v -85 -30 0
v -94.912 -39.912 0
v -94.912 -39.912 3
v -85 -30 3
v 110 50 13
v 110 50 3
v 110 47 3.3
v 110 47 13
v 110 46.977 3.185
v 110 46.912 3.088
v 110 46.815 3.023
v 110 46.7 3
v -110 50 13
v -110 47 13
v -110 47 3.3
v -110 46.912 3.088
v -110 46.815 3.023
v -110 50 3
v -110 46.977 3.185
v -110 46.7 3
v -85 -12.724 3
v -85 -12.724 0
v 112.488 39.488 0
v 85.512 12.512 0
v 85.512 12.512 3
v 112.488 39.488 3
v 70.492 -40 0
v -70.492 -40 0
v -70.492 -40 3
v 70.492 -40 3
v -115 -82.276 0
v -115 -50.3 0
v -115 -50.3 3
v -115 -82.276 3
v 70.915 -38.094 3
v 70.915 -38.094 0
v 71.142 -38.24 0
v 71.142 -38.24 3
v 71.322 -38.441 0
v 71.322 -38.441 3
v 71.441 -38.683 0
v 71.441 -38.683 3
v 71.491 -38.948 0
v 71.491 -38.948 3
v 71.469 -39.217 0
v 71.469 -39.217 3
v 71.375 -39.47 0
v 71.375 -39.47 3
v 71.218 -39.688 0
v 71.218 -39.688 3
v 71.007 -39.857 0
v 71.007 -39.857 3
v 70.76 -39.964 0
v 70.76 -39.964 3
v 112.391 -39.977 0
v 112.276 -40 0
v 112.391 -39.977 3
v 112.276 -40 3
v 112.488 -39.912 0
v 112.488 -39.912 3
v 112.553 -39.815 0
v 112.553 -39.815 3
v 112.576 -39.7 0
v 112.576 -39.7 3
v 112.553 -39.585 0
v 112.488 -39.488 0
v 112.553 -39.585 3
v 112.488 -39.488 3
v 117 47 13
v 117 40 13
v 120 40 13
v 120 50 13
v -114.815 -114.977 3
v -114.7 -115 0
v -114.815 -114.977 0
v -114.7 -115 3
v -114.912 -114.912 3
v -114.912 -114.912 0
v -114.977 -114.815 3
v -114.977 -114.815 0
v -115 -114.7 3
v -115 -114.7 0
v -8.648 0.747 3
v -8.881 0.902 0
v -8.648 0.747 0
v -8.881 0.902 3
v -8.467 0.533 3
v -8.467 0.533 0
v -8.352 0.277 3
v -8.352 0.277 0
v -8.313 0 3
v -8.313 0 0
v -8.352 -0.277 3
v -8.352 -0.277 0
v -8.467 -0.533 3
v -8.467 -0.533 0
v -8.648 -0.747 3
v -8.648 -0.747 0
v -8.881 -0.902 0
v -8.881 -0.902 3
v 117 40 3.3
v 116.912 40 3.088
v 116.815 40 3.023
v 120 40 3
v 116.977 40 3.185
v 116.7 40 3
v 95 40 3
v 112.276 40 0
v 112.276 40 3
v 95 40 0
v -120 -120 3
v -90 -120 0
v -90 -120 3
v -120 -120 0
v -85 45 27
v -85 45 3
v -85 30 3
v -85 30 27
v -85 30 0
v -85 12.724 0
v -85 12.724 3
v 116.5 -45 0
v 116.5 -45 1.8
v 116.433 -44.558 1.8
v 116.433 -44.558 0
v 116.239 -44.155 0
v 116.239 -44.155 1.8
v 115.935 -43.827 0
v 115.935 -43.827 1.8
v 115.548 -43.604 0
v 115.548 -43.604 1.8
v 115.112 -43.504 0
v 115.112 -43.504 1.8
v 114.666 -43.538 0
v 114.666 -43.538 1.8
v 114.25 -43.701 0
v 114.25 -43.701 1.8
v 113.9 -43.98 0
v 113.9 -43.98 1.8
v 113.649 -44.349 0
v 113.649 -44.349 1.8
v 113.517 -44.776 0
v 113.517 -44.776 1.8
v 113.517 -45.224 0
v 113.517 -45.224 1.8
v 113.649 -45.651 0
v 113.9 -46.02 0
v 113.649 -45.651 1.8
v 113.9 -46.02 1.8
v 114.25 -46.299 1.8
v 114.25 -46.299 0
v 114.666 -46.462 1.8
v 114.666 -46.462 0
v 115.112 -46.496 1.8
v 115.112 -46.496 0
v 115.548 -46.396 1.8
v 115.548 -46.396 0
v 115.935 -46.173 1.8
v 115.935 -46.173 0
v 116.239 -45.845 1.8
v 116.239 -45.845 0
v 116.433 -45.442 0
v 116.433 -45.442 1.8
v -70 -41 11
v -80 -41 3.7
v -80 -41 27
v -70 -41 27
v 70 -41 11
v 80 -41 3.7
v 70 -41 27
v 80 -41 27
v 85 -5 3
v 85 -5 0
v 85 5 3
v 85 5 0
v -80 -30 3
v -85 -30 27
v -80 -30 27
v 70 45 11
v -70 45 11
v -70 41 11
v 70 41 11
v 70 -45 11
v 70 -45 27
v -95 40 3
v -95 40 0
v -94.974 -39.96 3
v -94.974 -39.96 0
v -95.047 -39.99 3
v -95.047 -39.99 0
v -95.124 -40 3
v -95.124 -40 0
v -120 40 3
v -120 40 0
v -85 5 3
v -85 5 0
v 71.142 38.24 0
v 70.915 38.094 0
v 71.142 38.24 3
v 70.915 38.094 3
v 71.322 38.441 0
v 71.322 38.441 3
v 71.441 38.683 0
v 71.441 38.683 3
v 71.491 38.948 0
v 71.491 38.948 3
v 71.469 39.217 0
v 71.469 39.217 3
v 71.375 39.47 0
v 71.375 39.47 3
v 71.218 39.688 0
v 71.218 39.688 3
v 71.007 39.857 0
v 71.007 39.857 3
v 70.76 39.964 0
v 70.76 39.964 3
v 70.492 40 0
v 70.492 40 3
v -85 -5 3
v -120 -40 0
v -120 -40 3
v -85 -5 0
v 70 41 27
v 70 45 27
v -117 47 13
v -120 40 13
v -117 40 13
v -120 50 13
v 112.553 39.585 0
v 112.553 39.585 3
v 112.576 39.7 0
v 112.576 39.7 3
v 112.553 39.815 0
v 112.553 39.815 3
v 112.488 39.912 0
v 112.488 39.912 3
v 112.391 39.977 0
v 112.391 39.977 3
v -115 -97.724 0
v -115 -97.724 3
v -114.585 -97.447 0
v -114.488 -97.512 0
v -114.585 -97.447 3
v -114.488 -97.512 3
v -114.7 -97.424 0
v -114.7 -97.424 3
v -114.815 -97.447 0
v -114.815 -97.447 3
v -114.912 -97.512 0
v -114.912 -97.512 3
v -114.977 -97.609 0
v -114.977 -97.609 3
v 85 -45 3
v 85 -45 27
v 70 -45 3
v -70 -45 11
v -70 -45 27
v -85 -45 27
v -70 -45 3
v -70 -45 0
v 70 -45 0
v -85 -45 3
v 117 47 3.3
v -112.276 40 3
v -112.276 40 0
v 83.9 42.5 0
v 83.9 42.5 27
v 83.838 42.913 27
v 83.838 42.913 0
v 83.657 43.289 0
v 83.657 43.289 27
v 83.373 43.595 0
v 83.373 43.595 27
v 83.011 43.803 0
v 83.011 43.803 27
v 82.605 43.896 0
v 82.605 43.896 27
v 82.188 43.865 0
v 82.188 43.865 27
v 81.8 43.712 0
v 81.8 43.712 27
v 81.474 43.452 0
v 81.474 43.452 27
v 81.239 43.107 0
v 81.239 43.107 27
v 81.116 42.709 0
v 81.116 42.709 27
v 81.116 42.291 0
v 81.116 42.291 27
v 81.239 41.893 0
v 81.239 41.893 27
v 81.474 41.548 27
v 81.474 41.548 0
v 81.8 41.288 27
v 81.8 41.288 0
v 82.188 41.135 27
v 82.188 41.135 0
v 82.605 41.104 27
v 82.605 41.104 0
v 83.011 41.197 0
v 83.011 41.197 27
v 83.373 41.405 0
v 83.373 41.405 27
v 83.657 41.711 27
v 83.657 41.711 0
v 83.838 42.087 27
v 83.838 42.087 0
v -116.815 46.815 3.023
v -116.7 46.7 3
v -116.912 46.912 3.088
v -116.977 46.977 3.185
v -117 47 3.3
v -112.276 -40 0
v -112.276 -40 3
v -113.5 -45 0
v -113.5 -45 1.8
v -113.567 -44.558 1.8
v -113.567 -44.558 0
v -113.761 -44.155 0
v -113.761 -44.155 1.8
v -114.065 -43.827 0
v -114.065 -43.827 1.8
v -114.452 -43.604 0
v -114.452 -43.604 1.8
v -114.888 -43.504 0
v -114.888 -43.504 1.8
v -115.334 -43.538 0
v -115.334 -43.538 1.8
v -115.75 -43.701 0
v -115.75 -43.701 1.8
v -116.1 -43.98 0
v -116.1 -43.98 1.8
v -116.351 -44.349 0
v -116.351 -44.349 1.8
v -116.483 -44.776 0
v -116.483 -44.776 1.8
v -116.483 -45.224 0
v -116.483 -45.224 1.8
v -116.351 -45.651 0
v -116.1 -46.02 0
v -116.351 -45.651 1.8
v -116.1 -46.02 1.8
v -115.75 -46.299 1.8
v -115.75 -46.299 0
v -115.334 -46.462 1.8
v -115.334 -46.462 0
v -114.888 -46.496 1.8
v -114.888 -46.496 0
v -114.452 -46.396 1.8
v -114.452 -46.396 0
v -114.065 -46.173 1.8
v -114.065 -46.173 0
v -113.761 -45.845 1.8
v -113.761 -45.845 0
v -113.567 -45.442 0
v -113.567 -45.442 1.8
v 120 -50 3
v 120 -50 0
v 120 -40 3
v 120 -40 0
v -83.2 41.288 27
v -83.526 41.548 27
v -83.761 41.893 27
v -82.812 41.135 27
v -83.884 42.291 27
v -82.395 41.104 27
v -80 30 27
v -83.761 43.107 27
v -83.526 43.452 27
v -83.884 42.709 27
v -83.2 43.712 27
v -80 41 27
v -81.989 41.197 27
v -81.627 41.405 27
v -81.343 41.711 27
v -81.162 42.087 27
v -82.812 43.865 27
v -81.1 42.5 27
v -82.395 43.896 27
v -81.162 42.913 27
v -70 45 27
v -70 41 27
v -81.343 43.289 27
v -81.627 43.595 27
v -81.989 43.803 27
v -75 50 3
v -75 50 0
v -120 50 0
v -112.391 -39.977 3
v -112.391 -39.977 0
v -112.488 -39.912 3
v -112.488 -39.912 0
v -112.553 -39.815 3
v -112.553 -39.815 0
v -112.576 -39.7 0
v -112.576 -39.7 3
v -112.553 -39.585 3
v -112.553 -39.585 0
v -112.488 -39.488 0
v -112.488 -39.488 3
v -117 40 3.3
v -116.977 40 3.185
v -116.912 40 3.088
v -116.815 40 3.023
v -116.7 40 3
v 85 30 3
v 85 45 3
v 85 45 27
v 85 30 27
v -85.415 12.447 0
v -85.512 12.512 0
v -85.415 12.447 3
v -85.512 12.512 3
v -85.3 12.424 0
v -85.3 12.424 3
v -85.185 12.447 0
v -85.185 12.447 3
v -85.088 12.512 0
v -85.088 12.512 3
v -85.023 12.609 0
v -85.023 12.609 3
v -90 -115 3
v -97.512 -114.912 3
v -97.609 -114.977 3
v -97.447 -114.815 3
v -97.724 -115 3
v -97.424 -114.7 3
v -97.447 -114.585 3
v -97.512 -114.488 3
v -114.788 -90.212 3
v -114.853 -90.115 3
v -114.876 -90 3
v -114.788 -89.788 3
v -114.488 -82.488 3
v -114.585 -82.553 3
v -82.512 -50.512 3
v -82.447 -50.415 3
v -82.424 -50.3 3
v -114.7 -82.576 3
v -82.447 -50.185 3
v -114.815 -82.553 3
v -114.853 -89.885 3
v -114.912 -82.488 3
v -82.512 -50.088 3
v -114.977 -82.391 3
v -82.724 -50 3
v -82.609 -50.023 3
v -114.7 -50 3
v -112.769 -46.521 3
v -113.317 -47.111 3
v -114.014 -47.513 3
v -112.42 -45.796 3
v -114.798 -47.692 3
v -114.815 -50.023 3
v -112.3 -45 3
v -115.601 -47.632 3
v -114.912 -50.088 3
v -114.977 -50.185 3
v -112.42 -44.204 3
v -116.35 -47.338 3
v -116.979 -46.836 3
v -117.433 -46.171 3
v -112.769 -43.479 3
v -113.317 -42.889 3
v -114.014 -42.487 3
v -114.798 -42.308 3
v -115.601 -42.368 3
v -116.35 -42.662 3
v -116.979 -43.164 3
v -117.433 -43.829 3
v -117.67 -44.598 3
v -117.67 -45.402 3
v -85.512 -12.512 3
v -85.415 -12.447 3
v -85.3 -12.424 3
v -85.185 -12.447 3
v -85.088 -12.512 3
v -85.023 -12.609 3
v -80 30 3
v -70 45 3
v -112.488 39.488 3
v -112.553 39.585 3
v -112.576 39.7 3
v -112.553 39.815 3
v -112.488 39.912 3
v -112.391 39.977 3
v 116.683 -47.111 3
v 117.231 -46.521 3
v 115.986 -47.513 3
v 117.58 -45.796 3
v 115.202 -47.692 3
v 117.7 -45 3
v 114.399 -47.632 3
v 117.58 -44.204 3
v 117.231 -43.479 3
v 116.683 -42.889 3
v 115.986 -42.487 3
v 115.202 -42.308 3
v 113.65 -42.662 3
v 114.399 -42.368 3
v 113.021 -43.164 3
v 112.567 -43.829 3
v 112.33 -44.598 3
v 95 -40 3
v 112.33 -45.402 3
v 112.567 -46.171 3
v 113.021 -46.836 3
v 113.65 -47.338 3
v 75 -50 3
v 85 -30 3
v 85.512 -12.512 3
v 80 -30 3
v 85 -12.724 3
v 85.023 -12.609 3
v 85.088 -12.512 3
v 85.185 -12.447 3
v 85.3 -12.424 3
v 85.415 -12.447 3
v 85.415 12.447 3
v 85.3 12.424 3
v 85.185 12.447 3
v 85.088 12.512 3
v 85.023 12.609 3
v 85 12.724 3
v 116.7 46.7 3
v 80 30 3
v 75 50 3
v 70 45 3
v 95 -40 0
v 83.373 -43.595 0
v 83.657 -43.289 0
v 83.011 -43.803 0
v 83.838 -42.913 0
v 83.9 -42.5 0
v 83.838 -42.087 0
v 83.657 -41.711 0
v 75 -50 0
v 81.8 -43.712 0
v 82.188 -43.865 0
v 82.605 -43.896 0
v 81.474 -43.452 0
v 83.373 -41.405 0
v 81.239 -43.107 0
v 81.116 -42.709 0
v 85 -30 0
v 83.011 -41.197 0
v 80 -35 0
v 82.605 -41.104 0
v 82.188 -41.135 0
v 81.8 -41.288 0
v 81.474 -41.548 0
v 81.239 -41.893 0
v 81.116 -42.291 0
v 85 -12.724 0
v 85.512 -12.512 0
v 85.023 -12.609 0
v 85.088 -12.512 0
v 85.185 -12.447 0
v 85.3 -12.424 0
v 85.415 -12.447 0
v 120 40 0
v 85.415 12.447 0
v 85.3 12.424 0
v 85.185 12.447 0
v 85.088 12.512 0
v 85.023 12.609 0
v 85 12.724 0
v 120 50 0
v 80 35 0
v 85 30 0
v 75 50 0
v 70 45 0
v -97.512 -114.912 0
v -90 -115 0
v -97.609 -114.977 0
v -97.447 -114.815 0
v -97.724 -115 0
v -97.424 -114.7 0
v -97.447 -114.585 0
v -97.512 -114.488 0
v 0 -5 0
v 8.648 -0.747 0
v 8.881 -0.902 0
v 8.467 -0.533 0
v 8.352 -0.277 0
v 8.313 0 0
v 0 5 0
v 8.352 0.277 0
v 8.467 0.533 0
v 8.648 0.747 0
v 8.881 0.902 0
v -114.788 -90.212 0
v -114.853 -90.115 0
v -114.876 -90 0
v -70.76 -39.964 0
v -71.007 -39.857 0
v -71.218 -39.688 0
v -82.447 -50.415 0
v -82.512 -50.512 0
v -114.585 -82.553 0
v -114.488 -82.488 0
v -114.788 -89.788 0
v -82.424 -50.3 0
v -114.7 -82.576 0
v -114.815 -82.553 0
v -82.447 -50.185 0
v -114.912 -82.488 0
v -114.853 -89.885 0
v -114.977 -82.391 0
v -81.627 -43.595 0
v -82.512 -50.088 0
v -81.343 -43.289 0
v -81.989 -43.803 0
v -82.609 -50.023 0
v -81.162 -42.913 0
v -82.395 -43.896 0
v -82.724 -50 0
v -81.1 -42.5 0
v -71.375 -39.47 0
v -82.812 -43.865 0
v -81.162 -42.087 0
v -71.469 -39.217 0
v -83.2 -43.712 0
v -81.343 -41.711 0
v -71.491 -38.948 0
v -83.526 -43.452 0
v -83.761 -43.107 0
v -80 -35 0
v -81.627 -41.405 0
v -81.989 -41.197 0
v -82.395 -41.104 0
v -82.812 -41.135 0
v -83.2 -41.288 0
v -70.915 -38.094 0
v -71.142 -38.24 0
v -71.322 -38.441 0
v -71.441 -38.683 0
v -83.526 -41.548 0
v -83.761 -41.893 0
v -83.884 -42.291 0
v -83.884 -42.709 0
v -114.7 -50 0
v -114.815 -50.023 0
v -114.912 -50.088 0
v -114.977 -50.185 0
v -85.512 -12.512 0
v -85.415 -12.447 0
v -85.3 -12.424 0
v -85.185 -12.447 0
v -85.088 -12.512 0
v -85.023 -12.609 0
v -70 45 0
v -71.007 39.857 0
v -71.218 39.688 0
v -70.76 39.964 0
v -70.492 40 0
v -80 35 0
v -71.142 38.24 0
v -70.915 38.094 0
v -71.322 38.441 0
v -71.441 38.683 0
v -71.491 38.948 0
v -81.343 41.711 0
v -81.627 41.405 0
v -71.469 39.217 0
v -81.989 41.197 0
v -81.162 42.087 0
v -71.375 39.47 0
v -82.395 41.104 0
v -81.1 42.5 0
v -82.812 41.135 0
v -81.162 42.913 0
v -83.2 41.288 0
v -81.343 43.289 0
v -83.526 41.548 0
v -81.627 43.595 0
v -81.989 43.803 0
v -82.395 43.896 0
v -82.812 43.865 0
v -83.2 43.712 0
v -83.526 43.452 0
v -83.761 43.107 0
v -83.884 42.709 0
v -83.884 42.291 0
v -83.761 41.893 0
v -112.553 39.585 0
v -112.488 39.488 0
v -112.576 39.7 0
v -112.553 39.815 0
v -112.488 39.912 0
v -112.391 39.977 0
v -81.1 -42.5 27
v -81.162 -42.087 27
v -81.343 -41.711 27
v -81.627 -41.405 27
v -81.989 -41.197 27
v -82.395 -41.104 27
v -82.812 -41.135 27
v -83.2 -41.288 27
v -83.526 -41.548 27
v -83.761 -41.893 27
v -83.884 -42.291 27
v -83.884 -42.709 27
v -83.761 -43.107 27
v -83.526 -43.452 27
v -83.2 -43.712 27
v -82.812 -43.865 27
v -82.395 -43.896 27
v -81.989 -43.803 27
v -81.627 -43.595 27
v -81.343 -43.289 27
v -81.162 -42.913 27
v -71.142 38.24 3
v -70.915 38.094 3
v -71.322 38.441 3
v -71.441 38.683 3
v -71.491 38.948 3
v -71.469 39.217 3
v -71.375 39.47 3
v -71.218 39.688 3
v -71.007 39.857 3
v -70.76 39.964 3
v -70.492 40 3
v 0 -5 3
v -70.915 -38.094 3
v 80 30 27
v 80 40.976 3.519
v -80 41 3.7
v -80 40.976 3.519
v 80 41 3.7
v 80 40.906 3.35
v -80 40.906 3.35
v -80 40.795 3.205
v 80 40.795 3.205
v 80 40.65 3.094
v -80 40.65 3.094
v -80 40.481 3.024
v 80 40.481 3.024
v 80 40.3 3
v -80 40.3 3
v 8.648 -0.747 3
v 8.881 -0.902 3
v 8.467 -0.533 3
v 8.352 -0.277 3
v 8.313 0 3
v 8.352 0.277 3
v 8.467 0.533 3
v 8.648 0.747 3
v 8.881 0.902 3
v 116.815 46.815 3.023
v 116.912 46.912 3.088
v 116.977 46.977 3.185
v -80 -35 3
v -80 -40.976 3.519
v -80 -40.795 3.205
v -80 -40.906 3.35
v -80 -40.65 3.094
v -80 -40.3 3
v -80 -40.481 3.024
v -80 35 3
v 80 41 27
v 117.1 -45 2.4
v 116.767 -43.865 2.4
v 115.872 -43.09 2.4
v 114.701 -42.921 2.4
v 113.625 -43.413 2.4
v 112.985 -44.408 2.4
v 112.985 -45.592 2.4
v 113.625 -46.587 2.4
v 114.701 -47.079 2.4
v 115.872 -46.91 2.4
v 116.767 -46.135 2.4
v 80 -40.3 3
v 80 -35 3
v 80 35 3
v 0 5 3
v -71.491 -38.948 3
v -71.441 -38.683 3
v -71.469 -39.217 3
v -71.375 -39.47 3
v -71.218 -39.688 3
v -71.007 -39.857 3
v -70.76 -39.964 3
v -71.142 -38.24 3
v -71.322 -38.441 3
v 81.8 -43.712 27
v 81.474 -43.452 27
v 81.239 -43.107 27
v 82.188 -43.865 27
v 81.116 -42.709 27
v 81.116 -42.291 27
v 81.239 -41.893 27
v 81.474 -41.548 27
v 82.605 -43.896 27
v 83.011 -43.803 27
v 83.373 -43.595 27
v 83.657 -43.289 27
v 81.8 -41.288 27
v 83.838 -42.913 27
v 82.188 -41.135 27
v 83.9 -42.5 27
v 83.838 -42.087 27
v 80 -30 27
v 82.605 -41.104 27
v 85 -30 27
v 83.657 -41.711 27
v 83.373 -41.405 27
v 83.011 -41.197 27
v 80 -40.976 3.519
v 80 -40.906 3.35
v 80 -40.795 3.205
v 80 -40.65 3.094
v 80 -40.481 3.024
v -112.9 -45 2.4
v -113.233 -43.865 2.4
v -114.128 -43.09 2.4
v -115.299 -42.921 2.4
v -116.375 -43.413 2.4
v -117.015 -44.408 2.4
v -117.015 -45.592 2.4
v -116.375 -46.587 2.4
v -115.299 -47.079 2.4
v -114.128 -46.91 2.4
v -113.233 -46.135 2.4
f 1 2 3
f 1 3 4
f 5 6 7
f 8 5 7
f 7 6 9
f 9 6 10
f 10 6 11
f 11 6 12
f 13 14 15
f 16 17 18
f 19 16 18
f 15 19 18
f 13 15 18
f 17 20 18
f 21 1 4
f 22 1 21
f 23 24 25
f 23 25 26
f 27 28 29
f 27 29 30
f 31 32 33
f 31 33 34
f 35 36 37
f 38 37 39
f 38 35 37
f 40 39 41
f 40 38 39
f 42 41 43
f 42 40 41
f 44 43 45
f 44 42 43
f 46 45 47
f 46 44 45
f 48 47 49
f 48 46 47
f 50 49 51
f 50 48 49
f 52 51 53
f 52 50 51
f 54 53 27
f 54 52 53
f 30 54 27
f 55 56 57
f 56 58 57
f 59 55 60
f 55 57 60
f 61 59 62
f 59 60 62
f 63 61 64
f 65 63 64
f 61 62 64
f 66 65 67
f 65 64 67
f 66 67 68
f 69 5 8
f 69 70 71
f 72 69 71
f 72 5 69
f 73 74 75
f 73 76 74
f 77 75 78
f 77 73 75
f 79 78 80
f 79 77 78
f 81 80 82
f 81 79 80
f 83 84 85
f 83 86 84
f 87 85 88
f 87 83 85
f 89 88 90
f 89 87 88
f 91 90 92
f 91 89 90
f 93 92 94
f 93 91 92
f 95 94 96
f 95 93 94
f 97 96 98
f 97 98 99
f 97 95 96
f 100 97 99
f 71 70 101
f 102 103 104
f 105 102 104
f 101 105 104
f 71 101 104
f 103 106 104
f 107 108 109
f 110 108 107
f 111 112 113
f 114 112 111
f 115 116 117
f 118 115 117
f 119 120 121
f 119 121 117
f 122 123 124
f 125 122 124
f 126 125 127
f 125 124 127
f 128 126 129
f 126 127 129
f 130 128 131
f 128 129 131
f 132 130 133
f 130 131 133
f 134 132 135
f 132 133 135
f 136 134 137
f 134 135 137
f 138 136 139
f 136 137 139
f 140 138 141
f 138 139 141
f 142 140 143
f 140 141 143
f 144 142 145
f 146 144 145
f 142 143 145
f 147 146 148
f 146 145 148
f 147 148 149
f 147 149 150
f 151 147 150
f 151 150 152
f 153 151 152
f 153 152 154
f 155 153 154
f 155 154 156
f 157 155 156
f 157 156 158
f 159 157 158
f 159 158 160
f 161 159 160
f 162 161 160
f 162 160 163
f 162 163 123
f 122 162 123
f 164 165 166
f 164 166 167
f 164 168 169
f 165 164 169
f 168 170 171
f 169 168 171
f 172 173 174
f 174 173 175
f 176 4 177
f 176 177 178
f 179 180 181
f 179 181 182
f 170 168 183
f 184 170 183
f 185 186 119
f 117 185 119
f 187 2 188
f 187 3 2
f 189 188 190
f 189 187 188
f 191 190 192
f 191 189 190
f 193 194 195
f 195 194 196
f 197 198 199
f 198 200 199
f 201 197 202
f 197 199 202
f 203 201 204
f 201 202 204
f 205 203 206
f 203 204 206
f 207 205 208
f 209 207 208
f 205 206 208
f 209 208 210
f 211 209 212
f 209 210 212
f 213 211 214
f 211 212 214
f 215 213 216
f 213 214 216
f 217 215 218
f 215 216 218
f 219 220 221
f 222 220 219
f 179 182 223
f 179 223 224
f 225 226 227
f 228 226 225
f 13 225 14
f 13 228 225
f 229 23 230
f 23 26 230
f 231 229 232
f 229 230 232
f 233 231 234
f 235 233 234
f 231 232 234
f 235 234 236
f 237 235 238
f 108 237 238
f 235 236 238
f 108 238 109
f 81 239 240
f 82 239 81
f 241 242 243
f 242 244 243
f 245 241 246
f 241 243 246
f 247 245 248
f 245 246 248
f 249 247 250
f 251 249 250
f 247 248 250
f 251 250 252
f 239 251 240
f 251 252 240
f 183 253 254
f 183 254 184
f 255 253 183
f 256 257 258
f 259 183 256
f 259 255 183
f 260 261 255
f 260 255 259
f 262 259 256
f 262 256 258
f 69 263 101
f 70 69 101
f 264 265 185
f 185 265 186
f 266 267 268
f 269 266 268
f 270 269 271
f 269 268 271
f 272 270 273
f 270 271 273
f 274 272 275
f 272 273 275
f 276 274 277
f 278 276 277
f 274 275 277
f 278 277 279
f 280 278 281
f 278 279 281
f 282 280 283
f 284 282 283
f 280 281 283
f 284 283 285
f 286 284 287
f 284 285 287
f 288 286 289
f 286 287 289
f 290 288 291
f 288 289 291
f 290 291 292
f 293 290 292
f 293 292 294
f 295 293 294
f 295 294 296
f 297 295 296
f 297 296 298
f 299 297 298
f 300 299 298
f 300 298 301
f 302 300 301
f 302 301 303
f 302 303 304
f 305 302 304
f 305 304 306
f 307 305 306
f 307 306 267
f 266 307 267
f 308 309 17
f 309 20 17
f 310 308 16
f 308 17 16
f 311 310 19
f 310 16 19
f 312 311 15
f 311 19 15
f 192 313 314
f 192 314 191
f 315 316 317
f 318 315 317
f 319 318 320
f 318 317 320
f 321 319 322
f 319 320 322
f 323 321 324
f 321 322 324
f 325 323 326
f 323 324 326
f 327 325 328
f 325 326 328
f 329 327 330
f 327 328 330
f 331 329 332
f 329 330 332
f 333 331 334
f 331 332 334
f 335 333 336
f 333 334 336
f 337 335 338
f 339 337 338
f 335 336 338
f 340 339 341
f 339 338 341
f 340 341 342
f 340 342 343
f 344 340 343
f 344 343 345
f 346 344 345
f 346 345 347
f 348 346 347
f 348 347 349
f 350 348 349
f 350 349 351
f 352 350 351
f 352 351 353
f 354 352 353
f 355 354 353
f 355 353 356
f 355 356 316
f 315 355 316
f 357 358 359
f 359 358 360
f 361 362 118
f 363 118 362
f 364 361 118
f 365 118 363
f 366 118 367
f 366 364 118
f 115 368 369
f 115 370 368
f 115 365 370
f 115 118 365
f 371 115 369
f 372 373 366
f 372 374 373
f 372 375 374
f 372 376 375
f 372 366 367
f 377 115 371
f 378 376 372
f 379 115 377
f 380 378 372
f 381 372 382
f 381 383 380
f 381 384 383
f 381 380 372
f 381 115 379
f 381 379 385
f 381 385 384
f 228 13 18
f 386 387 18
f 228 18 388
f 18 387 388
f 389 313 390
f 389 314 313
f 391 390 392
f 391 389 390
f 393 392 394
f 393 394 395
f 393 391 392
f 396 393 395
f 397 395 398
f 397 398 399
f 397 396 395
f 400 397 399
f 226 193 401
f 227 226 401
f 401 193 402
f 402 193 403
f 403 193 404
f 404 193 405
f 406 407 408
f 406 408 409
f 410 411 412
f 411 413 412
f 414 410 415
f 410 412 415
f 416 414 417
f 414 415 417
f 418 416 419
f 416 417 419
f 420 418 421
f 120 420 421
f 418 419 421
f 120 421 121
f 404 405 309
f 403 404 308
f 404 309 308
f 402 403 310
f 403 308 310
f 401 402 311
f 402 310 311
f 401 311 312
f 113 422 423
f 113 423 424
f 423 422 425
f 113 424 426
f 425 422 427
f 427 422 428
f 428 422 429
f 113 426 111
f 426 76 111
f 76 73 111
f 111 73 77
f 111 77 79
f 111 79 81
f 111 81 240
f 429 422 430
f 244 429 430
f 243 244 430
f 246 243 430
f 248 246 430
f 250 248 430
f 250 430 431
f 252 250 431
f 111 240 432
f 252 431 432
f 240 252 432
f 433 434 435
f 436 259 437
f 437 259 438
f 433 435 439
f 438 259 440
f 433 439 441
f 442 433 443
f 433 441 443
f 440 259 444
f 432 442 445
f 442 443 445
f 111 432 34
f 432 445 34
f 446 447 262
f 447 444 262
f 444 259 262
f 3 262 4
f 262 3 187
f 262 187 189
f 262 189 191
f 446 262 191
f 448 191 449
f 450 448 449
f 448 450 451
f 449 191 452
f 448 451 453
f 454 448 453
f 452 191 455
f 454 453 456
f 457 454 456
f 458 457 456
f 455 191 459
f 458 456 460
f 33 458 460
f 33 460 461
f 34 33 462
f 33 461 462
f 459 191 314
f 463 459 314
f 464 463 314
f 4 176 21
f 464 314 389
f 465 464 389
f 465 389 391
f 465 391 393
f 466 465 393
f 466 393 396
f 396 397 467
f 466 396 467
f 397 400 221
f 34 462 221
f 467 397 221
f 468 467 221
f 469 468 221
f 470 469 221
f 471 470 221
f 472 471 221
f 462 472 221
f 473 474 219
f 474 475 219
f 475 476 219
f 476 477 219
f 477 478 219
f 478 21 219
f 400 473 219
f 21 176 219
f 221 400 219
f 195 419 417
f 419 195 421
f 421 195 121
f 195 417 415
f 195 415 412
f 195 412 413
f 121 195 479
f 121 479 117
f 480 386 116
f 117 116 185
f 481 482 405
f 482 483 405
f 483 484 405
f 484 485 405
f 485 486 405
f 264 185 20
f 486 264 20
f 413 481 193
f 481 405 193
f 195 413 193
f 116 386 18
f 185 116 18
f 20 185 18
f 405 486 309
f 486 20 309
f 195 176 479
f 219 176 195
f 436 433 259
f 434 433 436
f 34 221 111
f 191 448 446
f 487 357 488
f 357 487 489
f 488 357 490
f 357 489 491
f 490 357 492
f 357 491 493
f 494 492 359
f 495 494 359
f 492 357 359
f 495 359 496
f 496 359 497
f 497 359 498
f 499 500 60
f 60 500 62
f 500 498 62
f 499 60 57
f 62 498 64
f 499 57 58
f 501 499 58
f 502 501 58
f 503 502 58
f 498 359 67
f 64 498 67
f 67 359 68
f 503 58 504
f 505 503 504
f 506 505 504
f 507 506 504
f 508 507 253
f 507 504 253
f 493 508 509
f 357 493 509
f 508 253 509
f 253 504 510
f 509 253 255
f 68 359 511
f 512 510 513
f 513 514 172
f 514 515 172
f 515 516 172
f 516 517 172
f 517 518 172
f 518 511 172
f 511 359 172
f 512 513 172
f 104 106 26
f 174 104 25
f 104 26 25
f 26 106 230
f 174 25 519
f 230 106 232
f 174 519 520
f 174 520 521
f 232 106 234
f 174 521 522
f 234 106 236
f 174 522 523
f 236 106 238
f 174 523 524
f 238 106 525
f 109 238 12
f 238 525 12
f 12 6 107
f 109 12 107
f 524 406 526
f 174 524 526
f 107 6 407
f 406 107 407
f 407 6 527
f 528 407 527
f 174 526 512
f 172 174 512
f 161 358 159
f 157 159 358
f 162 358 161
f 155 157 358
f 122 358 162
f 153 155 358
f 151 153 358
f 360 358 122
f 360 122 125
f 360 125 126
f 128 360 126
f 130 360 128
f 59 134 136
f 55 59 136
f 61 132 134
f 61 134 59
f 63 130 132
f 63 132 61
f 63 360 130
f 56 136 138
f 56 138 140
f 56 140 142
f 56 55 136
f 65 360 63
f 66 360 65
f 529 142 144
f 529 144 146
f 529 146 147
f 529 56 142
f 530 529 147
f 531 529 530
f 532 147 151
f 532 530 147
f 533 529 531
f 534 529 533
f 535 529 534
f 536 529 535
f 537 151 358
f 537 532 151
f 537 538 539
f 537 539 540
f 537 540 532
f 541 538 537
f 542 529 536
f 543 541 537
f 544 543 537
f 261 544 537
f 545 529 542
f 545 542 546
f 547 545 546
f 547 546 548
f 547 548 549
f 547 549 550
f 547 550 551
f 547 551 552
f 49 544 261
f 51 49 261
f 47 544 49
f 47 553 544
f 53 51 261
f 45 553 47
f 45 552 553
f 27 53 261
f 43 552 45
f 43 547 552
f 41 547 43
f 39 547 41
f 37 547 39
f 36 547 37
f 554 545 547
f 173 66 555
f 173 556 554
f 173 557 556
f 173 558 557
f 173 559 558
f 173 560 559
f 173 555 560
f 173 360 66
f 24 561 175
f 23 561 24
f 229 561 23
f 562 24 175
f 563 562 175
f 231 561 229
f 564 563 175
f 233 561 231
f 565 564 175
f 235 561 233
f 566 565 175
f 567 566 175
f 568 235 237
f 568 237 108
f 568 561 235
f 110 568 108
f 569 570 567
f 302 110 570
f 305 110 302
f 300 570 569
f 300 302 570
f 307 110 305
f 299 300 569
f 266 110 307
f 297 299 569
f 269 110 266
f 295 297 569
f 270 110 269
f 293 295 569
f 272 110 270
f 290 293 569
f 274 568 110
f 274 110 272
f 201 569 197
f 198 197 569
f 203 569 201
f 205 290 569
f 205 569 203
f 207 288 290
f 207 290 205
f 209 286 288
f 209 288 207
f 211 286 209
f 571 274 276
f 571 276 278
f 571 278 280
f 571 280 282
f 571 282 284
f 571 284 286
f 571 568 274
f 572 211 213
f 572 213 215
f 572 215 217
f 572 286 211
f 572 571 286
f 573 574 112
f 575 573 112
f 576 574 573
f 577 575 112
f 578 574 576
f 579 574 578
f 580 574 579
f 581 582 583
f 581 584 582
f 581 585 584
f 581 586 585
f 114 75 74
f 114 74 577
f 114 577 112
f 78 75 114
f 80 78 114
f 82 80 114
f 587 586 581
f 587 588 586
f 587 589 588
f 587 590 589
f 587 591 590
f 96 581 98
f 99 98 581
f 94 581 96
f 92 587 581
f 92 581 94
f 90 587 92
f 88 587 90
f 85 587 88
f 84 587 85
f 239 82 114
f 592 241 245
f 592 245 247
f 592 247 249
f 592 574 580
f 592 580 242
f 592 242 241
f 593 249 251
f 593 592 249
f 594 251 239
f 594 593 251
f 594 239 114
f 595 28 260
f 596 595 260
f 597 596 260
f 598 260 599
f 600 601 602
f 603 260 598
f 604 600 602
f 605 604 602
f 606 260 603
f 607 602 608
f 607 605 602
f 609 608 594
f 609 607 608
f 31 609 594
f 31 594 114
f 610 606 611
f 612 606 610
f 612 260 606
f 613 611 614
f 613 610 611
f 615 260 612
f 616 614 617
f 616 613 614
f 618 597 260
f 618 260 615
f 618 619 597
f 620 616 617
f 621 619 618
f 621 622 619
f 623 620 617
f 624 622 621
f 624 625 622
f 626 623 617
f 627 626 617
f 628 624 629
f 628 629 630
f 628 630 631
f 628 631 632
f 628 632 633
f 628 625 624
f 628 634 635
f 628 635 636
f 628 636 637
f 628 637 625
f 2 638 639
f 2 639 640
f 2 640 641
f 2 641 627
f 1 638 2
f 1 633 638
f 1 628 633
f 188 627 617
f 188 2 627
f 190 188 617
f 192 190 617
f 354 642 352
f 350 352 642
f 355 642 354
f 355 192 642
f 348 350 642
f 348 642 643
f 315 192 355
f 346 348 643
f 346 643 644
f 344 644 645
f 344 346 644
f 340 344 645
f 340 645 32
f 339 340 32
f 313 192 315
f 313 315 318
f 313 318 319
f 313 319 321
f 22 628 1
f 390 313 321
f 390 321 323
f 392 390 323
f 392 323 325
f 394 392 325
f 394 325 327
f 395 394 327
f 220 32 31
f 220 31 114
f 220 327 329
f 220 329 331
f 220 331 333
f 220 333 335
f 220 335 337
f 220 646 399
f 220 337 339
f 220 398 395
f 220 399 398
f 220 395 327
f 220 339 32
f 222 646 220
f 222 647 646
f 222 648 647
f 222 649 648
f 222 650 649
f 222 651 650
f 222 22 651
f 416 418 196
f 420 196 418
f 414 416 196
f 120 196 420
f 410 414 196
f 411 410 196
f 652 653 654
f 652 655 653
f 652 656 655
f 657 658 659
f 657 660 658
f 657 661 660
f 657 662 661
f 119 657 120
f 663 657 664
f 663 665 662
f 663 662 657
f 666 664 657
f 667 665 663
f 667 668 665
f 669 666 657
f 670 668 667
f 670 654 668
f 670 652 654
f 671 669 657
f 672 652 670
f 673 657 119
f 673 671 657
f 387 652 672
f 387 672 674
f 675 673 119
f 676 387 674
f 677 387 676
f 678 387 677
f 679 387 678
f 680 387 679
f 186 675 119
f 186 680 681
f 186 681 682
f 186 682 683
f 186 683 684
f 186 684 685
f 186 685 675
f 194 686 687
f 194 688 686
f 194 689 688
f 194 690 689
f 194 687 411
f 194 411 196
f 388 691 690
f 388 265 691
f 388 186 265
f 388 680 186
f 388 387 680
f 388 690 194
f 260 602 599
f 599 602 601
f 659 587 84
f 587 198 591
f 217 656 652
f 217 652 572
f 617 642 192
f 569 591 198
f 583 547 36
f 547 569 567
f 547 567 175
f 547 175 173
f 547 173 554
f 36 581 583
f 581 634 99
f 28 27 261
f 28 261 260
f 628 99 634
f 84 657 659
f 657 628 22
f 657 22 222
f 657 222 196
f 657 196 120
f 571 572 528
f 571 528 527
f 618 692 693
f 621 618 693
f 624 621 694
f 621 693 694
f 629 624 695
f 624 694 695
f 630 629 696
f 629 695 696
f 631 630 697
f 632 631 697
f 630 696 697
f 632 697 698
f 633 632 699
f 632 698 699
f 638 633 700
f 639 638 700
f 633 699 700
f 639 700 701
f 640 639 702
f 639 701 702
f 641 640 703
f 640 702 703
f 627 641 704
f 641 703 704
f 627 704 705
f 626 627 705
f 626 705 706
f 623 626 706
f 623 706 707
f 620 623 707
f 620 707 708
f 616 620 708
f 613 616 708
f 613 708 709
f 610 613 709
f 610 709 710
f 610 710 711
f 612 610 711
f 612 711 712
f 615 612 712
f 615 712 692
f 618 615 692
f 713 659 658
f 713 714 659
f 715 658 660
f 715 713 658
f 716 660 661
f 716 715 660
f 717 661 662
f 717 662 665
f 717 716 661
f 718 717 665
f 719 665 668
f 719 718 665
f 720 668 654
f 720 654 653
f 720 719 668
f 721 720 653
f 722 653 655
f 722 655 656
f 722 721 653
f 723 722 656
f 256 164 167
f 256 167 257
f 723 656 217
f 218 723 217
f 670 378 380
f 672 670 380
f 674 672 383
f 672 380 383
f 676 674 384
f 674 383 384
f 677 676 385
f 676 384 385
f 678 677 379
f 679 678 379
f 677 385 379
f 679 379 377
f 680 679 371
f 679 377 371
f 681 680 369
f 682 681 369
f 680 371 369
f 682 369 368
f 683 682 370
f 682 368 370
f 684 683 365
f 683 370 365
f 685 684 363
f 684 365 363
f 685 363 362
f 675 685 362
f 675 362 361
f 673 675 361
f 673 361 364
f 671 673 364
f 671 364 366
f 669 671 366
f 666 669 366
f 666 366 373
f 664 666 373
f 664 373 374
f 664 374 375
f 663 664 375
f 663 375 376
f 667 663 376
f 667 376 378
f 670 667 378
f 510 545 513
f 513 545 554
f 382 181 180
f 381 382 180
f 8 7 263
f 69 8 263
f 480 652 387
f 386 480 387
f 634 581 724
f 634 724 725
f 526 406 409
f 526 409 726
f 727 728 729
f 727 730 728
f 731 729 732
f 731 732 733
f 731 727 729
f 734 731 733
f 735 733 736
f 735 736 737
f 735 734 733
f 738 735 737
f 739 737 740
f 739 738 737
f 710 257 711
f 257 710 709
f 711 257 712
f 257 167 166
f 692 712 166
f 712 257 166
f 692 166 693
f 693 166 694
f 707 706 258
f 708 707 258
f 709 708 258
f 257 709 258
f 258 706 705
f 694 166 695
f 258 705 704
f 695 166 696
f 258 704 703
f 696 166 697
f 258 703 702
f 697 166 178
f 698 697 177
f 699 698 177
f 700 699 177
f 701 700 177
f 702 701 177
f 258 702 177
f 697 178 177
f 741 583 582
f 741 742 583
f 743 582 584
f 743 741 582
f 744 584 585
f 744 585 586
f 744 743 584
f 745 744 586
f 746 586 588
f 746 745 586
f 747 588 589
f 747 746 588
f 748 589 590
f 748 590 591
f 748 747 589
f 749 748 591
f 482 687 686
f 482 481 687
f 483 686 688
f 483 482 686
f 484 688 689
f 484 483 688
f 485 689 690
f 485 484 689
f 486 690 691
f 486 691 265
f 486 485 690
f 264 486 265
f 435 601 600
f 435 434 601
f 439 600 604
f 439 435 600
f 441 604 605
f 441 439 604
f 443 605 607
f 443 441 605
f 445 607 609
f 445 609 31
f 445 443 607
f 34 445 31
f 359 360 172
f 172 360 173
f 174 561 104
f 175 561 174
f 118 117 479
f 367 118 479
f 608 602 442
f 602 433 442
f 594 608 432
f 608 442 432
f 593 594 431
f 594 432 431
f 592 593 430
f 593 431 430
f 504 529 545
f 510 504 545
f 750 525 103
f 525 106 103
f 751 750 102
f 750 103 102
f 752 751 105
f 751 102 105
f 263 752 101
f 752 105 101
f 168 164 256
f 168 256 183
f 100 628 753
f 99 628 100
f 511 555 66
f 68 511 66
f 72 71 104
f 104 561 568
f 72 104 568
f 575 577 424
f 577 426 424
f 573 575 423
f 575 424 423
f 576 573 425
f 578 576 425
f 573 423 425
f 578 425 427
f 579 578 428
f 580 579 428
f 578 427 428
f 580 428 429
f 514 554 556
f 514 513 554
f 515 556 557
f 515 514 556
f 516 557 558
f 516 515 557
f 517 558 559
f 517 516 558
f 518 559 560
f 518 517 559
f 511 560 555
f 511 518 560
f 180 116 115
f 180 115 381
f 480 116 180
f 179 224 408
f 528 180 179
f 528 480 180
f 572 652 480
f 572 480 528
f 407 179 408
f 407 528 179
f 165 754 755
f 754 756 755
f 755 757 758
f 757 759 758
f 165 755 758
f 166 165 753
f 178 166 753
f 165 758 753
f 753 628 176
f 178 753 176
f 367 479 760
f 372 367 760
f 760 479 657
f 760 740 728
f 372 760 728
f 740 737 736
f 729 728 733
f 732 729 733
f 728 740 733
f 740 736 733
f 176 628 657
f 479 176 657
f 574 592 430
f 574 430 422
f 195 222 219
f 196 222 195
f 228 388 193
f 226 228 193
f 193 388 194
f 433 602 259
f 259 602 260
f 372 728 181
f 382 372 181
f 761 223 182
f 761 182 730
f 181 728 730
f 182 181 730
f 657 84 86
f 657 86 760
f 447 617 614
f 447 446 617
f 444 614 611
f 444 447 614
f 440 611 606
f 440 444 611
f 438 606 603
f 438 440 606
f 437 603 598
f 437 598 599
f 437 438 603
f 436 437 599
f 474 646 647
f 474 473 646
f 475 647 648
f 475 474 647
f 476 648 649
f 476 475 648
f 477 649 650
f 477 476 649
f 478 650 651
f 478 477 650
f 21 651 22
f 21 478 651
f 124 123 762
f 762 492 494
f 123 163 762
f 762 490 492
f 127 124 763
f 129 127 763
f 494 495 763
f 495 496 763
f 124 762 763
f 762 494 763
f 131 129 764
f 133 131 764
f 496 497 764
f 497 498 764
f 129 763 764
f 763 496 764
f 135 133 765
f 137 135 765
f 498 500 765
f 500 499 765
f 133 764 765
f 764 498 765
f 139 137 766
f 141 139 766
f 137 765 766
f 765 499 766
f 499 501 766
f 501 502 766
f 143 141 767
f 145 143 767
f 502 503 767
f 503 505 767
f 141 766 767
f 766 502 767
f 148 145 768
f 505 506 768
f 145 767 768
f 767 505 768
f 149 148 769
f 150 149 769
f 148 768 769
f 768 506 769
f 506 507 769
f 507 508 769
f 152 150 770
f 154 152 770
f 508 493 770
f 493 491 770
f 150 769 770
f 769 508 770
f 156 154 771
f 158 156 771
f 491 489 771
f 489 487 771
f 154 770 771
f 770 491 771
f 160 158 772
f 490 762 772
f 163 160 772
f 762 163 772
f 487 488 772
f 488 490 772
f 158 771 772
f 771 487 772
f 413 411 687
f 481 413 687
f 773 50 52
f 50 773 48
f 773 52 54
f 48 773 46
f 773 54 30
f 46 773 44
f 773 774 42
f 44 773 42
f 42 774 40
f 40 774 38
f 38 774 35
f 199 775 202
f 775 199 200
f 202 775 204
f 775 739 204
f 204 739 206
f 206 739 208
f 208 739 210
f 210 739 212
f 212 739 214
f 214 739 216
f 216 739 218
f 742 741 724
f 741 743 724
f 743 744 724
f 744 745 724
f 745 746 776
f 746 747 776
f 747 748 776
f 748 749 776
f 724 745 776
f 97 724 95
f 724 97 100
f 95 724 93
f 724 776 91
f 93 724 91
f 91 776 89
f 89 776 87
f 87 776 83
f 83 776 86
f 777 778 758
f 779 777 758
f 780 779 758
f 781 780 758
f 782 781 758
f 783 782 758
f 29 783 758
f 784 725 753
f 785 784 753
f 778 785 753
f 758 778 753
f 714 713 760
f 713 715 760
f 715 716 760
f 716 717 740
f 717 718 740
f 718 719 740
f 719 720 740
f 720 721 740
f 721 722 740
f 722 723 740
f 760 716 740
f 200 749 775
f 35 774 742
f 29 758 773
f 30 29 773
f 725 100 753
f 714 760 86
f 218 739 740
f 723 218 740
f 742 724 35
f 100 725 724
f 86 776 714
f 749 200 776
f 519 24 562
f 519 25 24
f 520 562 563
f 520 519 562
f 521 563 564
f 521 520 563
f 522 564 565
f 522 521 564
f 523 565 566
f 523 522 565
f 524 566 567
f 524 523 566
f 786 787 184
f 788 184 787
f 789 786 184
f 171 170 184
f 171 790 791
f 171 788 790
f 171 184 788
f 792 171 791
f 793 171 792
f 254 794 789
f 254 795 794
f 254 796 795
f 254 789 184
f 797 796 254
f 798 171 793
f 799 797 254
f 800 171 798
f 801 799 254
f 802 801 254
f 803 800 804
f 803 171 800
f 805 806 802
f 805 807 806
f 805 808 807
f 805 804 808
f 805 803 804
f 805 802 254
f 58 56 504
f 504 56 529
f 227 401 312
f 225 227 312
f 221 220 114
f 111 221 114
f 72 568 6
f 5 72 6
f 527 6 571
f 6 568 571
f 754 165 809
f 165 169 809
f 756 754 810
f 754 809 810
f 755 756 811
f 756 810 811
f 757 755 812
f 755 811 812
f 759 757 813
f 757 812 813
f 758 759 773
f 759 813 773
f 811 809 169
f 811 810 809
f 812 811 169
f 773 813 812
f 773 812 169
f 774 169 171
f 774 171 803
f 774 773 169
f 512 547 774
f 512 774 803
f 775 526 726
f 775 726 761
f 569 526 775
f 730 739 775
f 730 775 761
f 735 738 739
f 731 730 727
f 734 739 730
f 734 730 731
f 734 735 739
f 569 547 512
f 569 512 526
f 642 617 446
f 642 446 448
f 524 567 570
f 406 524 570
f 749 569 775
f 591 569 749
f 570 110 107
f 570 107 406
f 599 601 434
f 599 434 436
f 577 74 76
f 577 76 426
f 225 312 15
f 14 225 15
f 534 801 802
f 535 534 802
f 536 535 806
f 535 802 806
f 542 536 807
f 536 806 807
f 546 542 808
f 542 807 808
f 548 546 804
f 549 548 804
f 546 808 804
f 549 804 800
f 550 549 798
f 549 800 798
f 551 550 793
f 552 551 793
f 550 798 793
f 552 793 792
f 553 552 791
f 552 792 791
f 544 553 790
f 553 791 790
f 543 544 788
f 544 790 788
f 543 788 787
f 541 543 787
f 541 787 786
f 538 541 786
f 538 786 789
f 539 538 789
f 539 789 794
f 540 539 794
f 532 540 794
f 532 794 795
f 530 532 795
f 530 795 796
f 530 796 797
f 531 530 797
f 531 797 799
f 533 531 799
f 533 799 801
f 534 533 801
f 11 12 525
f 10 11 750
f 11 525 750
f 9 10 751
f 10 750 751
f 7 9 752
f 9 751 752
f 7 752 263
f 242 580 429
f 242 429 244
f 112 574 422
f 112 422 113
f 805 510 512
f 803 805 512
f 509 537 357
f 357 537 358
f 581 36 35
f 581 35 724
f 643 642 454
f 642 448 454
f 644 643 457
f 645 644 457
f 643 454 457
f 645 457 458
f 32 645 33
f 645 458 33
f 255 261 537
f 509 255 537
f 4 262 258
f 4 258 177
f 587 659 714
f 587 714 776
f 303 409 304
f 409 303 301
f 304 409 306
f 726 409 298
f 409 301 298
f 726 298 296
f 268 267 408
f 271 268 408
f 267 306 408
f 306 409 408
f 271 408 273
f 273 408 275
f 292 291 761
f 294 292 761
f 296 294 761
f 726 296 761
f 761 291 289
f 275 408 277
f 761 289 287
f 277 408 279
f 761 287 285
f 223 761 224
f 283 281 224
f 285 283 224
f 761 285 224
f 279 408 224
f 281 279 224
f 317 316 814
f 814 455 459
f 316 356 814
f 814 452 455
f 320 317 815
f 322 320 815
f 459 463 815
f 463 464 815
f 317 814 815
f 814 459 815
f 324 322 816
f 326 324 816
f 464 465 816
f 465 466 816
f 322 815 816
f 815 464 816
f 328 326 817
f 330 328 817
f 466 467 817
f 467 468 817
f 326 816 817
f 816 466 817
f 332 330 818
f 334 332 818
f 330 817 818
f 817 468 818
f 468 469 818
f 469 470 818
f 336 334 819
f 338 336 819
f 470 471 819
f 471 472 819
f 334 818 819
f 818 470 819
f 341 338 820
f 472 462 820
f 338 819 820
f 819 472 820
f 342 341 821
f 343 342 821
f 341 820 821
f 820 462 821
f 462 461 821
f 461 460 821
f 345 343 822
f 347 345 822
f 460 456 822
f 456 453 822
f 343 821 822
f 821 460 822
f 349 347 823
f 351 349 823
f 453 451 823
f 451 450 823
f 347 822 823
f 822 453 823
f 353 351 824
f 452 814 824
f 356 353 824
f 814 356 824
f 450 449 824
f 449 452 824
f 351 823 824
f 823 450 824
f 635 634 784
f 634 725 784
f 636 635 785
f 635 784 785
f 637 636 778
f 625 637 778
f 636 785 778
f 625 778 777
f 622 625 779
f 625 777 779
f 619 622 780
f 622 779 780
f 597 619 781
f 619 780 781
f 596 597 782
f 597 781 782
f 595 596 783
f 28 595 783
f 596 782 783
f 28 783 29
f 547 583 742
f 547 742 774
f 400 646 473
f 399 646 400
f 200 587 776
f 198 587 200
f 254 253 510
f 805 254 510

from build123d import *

# Parameters (mm, degrees)
SKETCH003_W     = 170
SKETCH003_H     = 90
SKETCH003_W_2   = 160
SKETCH003_H_2   = 80
PAD_DEPTH       = 3
PAD001_DEPTH    = 3
PAD002_DEPTH    = 3
PAD003_DEPTH    = 3
PAD004_DEPTH    = 3
PAD005_DEPTH    = 10
PAD006_DEPTH    = 10
PAD007_DEPTH    = 24
SKETCH014_R     = 1.65
HOLE_DEPTH      = 30
SKETCH015_R     = 1.325
HOLE001_DEPTH   = 30
SKETCH016_R     = 1.325
HOLE002_DEPTH   = 30
SKETCH017_R     = 1.325
HOLE003_DEPTH   = 30
FILLET_R        = 0.3
FILLET001_R     = 0.3
FILLET002_R     = 0.3
FILLET003_R     = 0.3
FILLET004_R     = 0.3
FILLET005_R     = 0.3
FILLET006_R     = 0.3
FILLET007_R     = 0.3
FILLET008_R     = 0.3
FILLET009_R     = 0.3
SKETCH018_W     = 3.707428
SKETCH018_H     = 3.707435
PAD008_DEPTH    = 27
SKETCH019_W     = 4.325348
SKETCH019_H     = 3.769226
PAD009_DEPTH    = 27
SKETCH020_W     = 4.473305
SKETCH020_H     = 4.349049
PAD010_DEPTH    = 27
SKETCH021_W     = 3.413819
SKETCH021_H     = 3.638272
PAD011_DEPTH    = 27
SKETCH023_R     = 1.4
POCKET_DEPTH    = 30
SKETCH024_R     = 1.4
POCKET001_DEPTH = 30
SKETCH025_R     = 1.4
POCKET002_DEPTH = 30
SKETCH026_R     = 1.4
POCKET003_DEPTH = 30
SKETCH027_R     = 1.5
POCKET004_DEPTH = 5
CHAMFER_SIZE    = 1.2
SKETCH028_W     = 10
SKETCH028_H     = 1
POCKET005_DEPTH = 24
SKETCH029_W     = 10
SKETCH029_H     = 1
POCKET006_DEPTH = 24
SKETCH030_W     = 10
SKETCH030_H     = 1
POCKET007_DEPTH = 24
PAD012_DEPTH    = 3
SKETCH032_W     = 140
SKETCH032_H     = 4
PAD013_DEPTH    = 8
FILLET010_R     = 0.7
FILLET011_R     = 1


with BuildPart() as part:
    # Sketch003 → Pad (new body)
    with BuildSketch(Plane.XY):
        Rectangle(SKETCH003_W, SKETCH003_H)
        Rectangle(SKETCH003_W_2, SKETCH003_H_2, mode=Mode.SUBTRACT)
    extrude(amount=PAD_DEPTH)

    # Sketch005 → Pad001 (join)
    with BuildSketch(Plane.XY):
        Polygon((-70, 45), (-75, 50), (-120, 50), (-120, 40), (-85, 5), (-85, 12), (-113, 40), (-95, 40), (-85, 30), (-85, 45), align=None)
    extrude(amount=PAD001_DEPTH)

    # Sketch007 → Pad002 (join)
    with BuildSketch(Plane.XY):
        Polygon((70, 45), (75, 50), (120, 50), (120, 40), (85, 5), (85, 12), (113, 40), (95, 40), (85, 30), (85, 45), align=None)
    extrude(amount=PAD002_DEPTH)

    # Sketch008 → Pad003 (join)
    with BuildSketch(Plane.XY):
        Polygon((70, -45), (75, -50), (120, -50), (120, -40), (85, -5), (85, -12), (113, -40), (95, -40), (85, -30), (85, -45), align=None)
    extrude(amount=PAD003_DEPTH)

    # Sketch009 → Pad004 (join)
    with BuildSketch(Plane.XY):
        Polygon((-70, -45), (-75, -50), (-115, -90), (-90, -115), (-90, -120), (-120, -120), (-120, -50), (-120, -40), (-85, -5), (-85, -12), (-113, -40), (-95, -40), (-85, -30), (-85, -45), align=None)
        Polygon((-115, -50), (-115, -83), (-82, -50), align=None, mode=Mode.SUBTRACT)
        Polygon((-115, -97), (-115, -115), (-97, -115), align=None, mode=Mode.SUBTRACT)
    extrude(amount=PAD004_DEPTH)

    # Sketch011 (on Face23 of Pad004) → Pad005 (join)
    with BuildSketch(Plane.XY.offset(3)):
        Polygon((-120, 50), (-120, 40), (-117, 40), (-117, 47), (-110, 47), (-110, 50), align=None)
    extrude(amount=PAD005_DEPTH)

    # Sketch012 (on Face22 of Pad005) → Pad006 (join)
    with BuildSketch(Plane.XY.offset(3)):
        Polygon((120, 50), (110, 50), (110, 47), (117, 47), (117, 40), (120, 40), align=None)
    extrude(amount=PAD006_DEPTH)

    # Sketch013 (on Face4 of Pad006) → Pad007 (join)
    with BuildSketch(Plane.XY.offset(3)):
        Polygon((-85, 45), (-85, 30), (-80, 30), (-80, 40), (-70, 40), (-70, 45), align=None)
        Polygon((85, 45), (85, 30), (80, 30), (80, 40), (70, 40), (70, 45), align=None)
        Polygon((85, -45), (85, -30), (80, -30), (80, -40), (70, -40), (70, -45), align=None)
        Polygon((-85, -45), (-85, -30), (-80, -30), (-80, -40), (-70, -40), (-70, -45), align=None)
    extrude(amount=PAD007_DEPTH)

    # Sketch014 (on Face80 of Pad007) → Hole (cut)
    with BuildSketch(Plane.XY.offset(27)):
        with Locations((-82.5, 42.5)):
            Circle(SKETCH014_R)
    extrude(amount=-HOLE_DEPTH, mode=Mode.SUBTRACT)

    # Sketch015 (on Face99 of Hole) → Hole001 (cut)
    with BuildSketch(Plane.XY.offset(27)):
        with Locations((-82.5, -42.5)):
            Circle(SKETCH015_R)
    extrude(amount=-HOLE001_DEPTH, mode=Mode.SUBTRACT)

    # Sketch016 (on Face84 of Hole001) → Hole002 (cut)
    with BuildSketch(Plane.XY.offset(27)):
        with Locations((82.5, 42.5)):
            Circle(SKETCH016_R)
    extrude(amount=-HOLE002_DEPTH, mode=Mode.SUBTRACT)

    # Sketch017 (on Face104 of Hole002) → Hole003 (cut)
    with BuildSketch(Plane.XY.offset(27)):
        with Locations((82.5, -42.5)):
            Circle(SKETCH017_R)
    extrude(amount=-HOLE003_DEPTH, mode=Mode.SUBTRACT)

    # Fillet
    fillet_edges = [part.edges().sort_by_distance(p)[0] for p in [
        (-115, -97, 1.5),
    ]]
    fillet(fillet_edges, radius=FILLET_R)

    # Fillet001
    fillet001_edges = [part.edges().sort_by_distance(p)[0] for p in [
        (-115, -115, 1.5),
    ]]
    fillet(fillet001_edges, radius=FILLET001_R)

    # Fillet002
    fillet002_edges = [part.edges().sort_by_distance(p)[0] for p in [
        (-97, -115, 1.5),
    ]]
    fillet(fillet002_edges, radius=FILLET002_R)

    # Fillet003
    fillet003_edges = [part.edges().sort_by_distance(p)[0] for p in [
        (-115, -90, 1.5),
    ]]
    fillet(fillet003_edges, radius=FILLET003_R)

    # Fillet004
    fillet004_edges = [part.edges().sort_by_distance(p)[0] for p in [
        (-115, -50, 1.5),
        (-115, -83, 1.5),
        (-82, -50, 1.5),
    ]]
    fillet(fillet004_edges, radius=FILLET004_R)

    # Fillet005
    fillet005_edges = [part.edges().sort_by_distance(p)[0] for p in [
        (-95, -40, 1.5),
        (-85, -12, 1.5),
        (-113, -40, 1.5),
    ]]
    fillet(fillet005_edges, radius=FILLET005_R)

    # Fillet006
    fillet006_edges = [part.edges().sort_by_distance(p)[0] for p in [
        (-117, 43.5, 3),
        (-113.5, 47, 3),
    ]]
    fillet(fillet006_edges, radius=FILLET006_R)

    # Fillet007
    fillet007_edges = [part.edges().sort_by_distance(p)[0] for p in [
        (-113, 40, 1.5),
        (-85, 12, 1.5),
    ]]
    fillet(fillet007_edges, radius=FILLET007_R)

    # Fillet008
    fillet008_edges = [part.edges().sort_by_distance(p)[0] for p in [
        (113.5, 47, 3),
        (117, 43.5, 3),
        (113, 40, 1.5),
        (85, 12, 1.5),
    ]]
    fillet(fillet008_edges, radius=FILLET008_R)

    # Fillet009
    fillet009_edges = [part.edges().sort_by_distance(p)[0] for p in [
        (113, -40, 1.5),
        (85, -12, 1.5),
    ]]
    fillet(fillet009_edges, radius=FILLET009_R)

    # Sketch018 (on Face81 of Fillet009) → Pad008 (join)
    with BuildSketch(Plane.XY.offset(27)):
        with Locations((82.542801, -42.437325)):
            Rectangle(SKETCH018_W, SKETCH018_H)
    extrude(amount=-PAD008_DEPTH)

    # Sketch019 (on Face37 of Pad008) → Pad009 (join)
    with BuildSketch(Plane.XY.offset(27)):
        with Locations((82.440964, 42.612553)):
            Rectangle(SKETCH019_W, SKETCH019_H)
    extrude(amount=-PAD009_DEPTH)

    # Sketch020 (on Face85 of Pad009) → Pad010 (join)
    with BuildSketch(Plane.XY.offset(27)):
        with Locations((-82.434589, 42.41842)):
            Rectangle(SKETCH020_W, SKETCH020_H)
    extrude(amount=-PAD010_DEPTH)

    # Sketch021 (on Face18 of Pad010) → Pad011 (join)
    with BuildSketch(Plane.XY.offset(27)):
        with Locations((-82.443809, -42.548483)):
            Rectangle(SKETCH021_W, SKETCH021_H)
    extrude(amount=-PAD011_DEPTH)

    # Sketch023 (on Face83 of Pad011) → Pocket (cut)
    with BuildSketch(Plane.XY.offset(27)):
        with Locations((-82.5, 42.5)):
            Circle(SKETCH023_R)
    extrude(amount=-POCKET_DEPTH, mode=Mode.SUBTRACT)

    # Sketch024 (on Face99 of Hole) → Pocket001 (cut)
    with BuildSketch(Plane.XY.offset(27)):
        with Locations((-82.5, -42.5)):
            Circle(SKETCH024_R)
    extrude(amount=-POCKET001_DEPTH, mode=Mode.SUBTRACT)

    # Sketch025 (on Face84 of Hole001) → Pocket002 (cut)
    with BuildSketch(Plane.XY.offset(27)):
        with Locations((82.5, 42.5)):
            Circle(SKETCH025_R)
    extrude(amount=-POCKET002_DEPTH, mode=Mode.SUBTRACT)

    # Sketch026 (on Face104 of Hole002) → Pocket003 (cut)
    with BuildSketch(Plane.XY.offset(27)):
        with Locations((82.5, -42.5)):
            Circle(SKETCH026_R)
    extrude(amount=-POCKET003_DEPTH, mode=Mode.SUBTRACT)

    # Sketch027 (on Face6 of Pocket003) → Pocket004 (cut)
    with BuildSketch(Plane.XY.offset(3)):
        with Locations((-115, -45)):
            Circle(SKETCH027_R)
        with Locations((115, -45)):
            Circle(SKETCH027_R)
    extrude(amount=-POCKET004_DEPTH, mode=Mode.SUBTRACT)

    # Chamfer
    chamfer_edges = [part.edges().sort_by_distance(p)[0] for p in [
        (-116.5, -45, 3),
        (113.5, -45, 3),
    ]]
    chamfer(chamfer_edges, length=CHAMFER_SIZE)

    # Sketch028 (on Face51 of Chamfer) → Pocket005 (cut)
    with BuildSketch(Plane.XY.offset(27)):
        with Locations((-75, 40.5)):
            Rectangle(SKETCH028_W, SKETCH028_H)
    extrude(amount=-POCKET005_DEPTH, mode=Mode.SUBTRACT)

    # Sketch029 (on Face96 of Pocket005) → Pocket006 (cut)
    with BuildSketch(Plane.XY.offset(27)):
        with Locations((75, 40.5)):
            Rectangle(SKETCH029_W, SKETCH029_H)
    extrude(amount=-POCKET006_DEPTH, mode=Mode.SUBTRACT)

    # Sketch030 (on Face98 of Pocket006) → Pocket007 (cut)
    with BuildSketch(Plane.XY.offset(27)):
        with Locations((75, -40.5)):
            Rectangle(SKETCH030_W, SKETCH030_H)
        with Locations((-75, -40.5)):
            Rectangle(SKETCH030_W, SKETCH030_H)
    extrude(amount=-POCKET007_DEPTH, mode=Mode.SUBTRACT)

    # Sketch031 → Pad012 (join)
    with BuildSketch(Plane.XY):
        Polygon((-80, 40), (-75, 40), (0, 5), (75, 40), (80, 40), (80, 35), (7, 0), (80, -35), (80, -40), (75, -40), (0, -5), (-75, -40), (-80, -40), (-80, -35), (-7, 0), (-80, 35), align=None)
    extrude(amount=PAD012_DEPTH)

    # Sketch032 (on Face109 of Pad012) → Pad013 (join)
    with BuildSketch(Plane.XY.offset(3)):
        with Locations((0, 43)):
            Rectangle(SKETCH032_W, SKETCH032_H)
        with Locations((0, -43)):
            Rectangle(SKETCH032_W, SKETCH032_H)
    extrude(amount=PAD013_DEPTH)

    # Fillet010
    fillet010_edges = [part.edges().sort_by_distance(p)[0] for p in [
        (0, 41, 3),
        (0, -41, 3),
    ]]
    fillet(fillet010_edges, radius=FILLET010_R)

    # Fillet011
    fillet011_edges = [part.edges().sort_by_distance(p)[0] for p in [
        (7, 0, 1.5),
        (-7, 0, 1.5),
        (-75, 40, 1.5),
        (-75, -40, 1.5),
        (75, -40, 1.5),
        (75, 40, 1.5),
    ]]
    fillet(fillet011_edges, radius=FILLET011_R)


solid = part.part
